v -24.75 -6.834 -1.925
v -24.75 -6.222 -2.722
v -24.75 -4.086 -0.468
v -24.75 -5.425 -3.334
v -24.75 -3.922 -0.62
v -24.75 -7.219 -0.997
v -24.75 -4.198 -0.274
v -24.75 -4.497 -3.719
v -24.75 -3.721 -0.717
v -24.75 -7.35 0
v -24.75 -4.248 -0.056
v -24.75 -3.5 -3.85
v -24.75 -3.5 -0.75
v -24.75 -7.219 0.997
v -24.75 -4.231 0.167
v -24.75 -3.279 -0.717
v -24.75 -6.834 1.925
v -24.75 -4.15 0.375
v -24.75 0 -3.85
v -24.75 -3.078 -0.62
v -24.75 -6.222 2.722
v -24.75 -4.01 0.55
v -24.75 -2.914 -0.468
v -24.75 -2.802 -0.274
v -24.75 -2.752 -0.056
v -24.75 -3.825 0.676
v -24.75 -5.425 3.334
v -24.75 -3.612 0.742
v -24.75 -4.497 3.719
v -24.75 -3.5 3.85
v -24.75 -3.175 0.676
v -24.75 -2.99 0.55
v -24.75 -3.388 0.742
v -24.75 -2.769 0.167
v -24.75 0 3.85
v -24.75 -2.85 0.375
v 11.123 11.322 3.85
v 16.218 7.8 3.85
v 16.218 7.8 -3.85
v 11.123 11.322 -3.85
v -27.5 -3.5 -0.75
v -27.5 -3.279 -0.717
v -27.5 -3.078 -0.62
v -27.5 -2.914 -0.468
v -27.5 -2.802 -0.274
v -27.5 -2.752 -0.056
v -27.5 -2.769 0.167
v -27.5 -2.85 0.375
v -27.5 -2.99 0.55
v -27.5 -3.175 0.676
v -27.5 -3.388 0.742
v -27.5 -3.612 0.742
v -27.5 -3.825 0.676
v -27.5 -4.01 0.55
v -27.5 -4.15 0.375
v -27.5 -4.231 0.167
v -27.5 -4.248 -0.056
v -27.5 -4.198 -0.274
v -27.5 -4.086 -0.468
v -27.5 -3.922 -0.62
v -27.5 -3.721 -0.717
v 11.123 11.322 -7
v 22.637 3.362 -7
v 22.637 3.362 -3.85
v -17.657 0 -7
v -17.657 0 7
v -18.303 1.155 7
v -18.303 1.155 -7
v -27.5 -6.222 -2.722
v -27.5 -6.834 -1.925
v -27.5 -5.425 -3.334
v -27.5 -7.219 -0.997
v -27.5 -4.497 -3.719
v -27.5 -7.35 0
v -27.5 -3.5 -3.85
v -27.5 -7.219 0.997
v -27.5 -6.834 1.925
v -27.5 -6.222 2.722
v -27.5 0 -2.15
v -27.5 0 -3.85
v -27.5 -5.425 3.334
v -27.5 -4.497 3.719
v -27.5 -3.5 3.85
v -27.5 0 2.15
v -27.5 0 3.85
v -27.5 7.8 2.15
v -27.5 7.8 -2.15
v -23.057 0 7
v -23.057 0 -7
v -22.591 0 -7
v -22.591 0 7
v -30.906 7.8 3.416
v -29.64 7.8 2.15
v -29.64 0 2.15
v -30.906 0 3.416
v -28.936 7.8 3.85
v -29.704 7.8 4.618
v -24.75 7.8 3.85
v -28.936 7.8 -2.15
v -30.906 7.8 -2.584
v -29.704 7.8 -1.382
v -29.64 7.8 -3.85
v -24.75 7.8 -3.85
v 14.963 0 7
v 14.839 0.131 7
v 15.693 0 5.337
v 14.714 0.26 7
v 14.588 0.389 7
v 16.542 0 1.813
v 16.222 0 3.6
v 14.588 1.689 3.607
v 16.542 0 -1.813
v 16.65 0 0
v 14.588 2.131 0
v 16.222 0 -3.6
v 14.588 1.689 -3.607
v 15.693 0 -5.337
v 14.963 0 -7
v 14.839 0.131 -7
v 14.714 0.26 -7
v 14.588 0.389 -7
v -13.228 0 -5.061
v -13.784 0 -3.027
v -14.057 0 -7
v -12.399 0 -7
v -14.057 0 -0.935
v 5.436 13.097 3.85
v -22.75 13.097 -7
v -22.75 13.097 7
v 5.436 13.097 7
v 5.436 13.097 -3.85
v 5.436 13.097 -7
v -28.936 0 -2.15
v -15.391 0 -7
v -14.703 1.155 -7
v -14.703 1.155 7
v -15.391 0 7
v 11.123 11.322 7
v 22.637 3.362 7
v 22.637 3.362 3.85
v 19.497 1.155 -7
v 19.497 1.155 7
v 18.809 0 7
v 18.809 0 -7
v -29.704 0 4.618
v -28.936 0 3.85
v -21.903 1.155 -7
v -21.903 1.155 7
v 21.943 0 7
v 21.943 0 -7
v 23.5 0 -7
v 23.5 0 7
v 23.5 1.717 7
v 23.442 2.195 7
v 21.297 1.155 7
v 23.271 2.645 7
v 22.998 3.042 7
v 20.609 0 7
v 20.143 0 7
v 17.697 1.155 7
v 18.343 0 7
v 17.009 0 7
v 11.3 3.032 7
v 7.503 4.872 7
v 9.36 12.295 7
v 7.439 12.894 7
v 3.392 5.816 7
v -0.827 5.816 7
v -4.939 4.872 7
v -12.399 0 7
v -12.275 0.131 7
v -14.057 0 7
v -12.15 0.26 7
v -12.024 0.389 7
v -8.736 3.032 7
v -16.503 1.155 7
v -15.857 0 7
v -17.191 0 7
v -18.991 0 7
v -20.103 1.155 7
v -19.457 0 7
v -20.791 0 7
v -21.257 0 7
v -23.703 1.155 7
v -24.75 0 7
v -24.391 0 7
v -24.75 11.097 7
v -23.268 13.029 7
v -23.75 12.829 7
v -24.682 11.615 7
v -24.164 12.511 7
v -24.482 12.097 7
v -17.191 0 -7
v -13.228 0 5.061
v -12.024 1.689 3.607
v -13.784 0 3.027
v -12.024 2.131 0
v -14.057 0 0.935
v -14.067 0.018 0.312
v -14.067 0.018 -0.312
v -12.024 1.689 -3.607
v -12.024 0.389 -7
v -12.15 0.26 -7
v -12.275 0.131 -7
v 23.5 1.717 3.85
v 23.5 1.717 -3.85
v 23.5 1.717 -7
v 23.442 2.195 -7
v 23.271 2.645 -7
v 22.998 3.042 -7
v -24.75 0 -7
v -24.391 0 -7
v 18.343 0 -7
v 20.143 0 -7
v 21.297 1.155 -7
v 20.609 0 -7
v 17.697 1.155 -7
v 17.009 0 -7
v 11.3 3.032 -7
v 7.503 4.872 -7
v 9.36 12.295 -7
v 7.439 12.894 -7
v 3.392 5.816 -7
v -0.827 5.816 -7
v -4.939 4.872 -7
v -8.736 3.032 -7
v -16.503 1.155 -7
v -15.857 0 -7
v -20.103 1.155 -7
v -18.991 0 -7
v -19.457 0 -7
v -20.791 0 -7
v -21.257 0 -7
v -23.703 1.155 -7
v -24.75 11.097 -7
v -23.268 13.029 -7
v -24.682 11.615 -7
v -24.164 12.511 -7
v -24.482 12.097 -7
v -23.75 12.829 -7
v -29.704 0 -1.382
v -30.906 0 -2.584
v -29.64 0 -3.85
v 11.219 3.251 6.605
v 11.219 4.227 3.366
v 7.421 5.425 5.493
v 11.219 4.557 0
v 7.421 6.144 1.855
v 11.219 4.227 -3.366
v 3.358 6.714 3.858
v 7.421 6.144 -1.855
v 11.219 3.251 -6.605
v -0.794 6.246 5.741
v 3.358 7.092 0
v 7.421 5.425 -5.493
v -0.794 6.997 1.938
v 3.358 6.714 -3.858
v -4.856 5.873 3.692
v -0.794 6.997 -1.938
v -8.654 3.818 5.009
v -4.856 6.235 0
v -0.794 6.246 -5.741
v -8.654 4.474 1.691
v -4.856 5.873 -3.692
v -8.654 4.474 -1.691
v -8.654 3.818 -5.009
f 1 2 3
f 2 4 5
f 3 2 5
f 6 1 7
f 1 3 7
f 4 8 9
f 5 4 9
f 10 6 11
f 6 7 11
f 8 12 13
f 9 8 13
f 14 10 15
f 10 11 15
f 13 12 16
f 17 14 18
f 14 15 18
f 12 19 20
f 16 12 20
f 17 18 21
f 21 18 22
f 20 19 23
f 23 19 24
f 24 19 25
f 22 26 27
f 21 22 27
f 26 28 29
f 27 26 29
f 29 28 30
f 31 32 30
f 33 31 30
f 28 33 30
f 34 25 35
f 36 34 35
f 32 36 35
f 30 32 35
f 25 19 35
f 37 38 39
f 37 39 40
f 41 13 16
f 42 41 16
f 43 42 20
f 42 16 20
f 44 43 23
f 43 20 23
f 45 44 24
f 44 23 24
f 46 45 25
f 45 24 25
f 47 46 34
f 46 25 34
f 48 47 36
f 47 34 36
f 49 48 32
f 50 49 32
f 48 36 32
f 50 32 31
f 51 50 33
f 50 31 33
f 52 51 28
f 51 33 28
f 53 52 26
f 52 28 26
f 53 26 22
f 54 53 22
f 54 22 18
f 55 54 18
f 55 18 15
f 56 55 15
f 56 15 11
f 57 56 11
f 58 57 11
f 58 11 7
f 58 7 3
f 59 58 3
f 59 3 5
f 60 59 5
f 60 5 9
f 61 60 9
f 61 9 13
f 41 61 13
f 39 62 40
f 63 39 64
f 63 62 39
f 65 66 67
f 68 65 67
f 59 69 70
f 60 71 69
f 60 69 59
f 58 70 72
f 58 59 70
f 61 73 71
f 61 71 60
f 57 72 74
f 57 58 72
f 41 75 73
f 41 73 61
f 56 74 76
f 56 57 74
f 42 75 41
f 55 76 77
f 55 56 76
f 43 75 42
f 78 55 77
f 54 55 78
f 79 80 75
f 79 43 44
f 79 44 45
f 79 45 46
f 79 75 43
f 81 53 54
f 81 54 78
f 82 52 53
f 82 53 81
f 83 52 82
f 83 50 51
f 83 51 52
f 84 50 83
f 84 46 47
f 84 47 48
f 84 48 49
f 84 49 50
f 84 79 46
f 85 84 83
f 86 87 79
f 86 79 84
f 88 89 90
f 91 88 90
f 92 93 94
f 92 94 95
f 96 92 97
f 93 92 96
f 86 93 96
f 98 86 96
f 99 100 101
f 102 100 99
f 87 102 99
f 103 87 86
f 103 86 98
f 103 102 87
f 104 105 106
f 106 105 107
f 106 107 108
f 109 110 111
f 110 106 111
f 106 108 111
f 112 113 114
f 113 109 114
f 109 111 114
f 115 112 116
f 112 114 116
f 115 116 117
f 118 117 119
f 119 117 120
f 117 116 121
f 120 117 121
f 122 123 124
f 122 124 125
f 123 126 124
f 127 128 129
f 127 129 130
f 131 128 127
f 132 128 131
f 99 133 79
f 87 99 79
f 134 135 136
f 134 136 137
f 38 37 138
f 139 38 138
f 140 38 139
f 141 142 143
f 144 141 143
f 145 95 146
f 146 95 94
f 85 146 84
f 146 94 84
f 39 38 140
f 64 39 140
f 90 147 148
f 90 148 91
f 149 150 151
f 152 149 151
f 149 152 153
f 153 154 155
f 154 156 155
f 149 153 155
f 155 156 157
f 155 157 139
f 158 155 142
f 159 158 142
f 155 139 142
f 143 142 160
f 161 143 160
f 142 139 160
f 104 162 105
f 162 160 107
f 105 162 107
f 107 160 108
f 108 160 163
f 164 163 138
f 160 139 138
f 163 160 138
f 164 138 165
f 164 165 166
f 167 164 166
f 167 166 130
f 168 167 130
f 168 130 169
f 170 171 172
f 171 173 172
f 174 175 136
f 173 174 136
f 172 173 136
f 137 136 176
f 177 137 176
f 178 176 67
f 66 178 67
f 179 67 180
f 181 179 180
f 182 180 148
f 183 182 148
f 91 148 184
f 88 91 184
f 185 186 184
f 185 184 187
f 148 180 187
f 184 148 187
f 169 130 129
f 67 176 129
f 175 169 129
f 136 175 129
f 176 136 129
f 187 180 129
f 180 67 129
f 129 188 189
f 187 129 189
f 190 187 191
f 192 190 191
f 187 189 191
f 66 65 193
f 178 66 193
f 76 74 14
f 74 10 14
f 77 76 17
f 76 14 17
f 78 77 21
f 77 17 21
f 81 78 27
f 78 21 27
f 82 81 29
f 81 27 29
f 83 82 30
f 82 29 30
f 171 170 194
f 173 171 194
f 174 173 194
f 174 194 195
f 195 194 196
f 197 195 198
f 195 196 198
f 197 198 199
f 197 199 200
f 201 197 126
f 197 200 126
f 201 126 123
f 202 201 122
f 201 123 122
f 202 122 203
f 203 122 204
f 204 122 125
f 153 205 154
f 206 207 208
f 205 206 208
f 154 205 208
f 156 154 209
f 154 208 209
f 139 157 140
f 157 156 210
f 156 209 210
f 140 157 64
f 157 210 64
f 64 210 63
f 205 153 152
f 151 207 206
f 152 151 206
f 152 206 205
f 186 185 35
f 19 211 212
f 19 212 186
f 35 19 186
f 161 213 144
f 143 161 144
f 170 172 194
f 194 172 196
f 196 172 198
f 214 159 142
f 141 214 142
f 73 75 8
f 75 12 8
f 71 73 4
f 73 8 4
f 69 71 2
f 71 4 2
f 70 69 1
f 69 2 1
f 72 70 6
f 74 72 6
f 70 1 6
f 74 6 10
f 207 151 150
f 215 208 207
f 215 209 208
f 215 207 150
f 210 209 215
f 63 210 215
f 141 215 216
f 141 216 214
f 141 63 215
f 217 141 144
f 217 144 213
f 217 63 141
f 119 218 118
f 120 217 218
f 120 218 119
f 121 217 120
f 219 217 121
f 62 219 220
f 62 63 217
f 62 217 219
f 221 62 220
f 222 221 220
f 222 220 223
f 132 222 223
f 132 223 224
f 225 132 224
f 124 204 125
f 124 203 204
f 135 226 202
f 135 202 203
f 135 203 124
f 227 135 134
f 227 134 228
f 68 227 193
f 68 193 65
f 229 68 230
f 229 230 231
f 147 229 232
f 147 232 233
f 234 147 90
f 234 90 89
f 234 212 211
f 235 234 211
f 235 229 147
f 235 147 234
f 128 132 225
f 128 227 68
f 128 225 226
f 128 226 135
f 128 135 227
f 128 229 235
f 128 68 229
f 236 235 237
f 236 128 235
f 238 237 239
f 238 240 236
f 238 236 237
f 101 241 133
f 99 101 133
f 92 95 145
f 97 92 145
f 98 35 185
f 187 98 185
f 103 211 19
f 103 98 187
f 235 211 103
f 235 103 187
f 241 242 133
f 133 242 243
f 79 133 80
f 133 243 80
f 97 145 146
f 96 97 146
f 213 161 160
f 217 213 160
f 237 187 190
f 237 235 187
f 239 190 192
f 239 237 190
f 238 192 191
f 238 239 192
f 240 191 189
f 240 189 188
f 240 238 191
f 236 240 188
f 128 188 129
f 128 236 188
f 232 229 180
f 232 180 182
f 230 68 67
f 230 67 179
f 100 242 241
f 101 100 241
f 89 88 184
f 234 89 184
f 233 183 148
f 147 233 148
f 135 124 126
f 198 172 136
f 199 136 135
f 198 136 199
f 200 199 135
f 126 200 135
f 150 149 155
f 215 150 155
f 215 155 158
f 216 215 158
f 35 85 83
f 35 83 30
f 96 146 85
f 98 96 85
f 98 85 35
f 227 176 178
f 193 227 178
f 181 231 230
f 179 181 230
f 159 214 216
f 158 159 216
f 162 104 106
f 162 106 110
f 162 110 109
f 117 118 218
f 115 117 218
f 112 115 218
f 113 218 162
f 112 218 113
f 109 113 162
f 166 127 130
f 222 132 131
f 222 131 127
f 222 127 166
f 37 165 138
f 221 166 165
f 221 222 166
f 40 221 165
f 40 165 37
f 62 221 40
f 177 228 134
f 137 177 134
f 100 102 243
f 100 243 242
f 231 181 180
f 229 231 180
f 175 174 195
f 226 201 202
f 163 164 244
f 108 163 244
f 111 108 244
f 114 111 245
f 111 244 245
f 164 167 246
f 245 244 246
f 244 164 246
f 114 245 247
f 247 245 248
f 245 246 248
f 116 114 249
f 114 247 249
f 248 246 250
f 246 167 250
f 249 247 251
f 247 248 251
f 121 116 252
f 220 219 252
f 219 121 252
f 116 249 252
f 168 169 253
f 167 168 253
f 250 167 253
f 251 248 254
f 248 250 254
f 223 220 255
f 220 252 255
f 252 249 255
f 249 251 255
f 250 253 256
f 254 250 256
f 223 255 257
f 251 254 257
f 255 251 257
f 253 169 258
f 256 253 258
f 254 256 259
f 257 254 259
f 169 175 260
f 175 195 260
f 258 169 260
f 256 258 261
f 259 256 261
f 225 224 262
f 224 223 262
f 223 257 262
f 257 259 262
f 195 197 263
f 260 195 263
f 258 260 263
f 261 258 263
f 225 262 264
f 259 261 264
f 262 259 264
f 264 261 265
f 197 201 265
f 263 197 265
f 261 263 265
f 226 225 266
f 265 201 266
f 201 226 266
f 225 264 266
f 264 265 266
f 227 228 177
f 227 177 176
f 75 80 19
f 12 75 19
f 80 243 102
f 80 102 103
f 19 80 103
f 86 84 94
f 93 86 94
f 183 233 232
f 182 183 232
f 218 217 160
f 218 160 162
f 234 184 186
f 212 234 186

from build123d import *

# Parameters (mm, degrees)
EXTRUDE_1_DEPTH              = 10
CUT_EXTRUDE_1_DEPTH          = 34.383433003
FILLET_1_SIZE                = 4
FILLET_1_SIZE_2              = 6
CUT_EXTRUDE_2_DEPTH          = 34.383433056
CUT_EXTRUDE_2_DEPTH_BACK     = 34.383433056
SKETCH_3_W                   = 58.405721138
SKETCH_3_H                   = 2.2
SKETCH_4_W                   = 2.75
SKETCH_4_H                   = 7.7
EXTRUDE_2_DEPTH              = 7.35
SKETCH_5_R                   = 0.75
CUT_EXTRUDE_3_DEPTH          = 54.030431013
FILLET_2_R                   = 3.85
CORTAR_EXTRUIR1_DEPTH        = 33.791669707
SALIENTE_EXTRUIR1_DEPTH      = 7.7
CROQUIS2_R                   = 20
CORTAR_EXTRUIR3_DEPTH        = 35.438086687
SALIENTE_EXTRUIR4_DEPTH      = 7
SALIENTE_EXTRUIR4_DEPTH_BACK = 7
CORTAR_EXTRUIR4_DEPTH        = 37.368830262
REDONDEO3_R                  = 2
REDONDEO4_R                  = 10


# Some blends are built 0.0001 mm under size
with BuildPart() as part:
    # 草图1 → 凸台-拉伸1 (new body)
    with BuildSketch(Plane(origin=(0, 0, 0), x_dir=(1, 0, 0), z_dir=(0, 1, 0))):
        Polygon((27.5, 3.85), (-27.5, 3.85), (-29.64, 3.85), (-30.905721138, 2.584278862), (-29.70363961, 1.382197334), (-28.935836944, 2.15), (-27.5, 2.15), (-27.5, -2.15), (-29.64, -2.15), (-30.905721138, -3.415721138), (-29.70363961, -4.617802666), (-28.935836944, -3.85), (-27.5, -3.85), (27.5, -3.85), align=None)
    extrude(amount=EXTRUDE_1_DEPTH)

    # 草图2 → 切除-拉伸1 (cut, through all)
    with BuildSketch(Plane.XY.offset(3.85)):
        with BuildLine():
            Line((-18.935836944, 0), (21.5, 0))
            ThreePointArc((21.5, 0), (1.282081528, 3.70613757), (-18.935836944, 0))
        make_face()
    extrude(amount=-CUT_EXTRUDE_1_DEPTH, mode=Mode.SUBTRACT)

    # 圆角1
    # an asymmetric fillet: 6, 4 mm, written as the material it takes off along each edge
    with BuildSketch(Plane(origin=(27.5, 0, 18.85), x_dir=(-1, 0, 0), z_dir=(0, 0, -1))) as fillet_1_piece_1:
        with BuildLine():
            Bezier((FILLET_1_SIZE, 0), (0, 0), (0, FILLET_1_SIZE_2), weights=[1, 0.707106781, 1])
            Line((0, FILLET_1_SIZE_2), (0, 0))
            Line((0, 0), (FILLET_1_SIZE, 0))
        make_face()
    extrude(amount=37.7, mode=Mode.SUBTRACT)

    # 草图3 → 切除-拉伸2 (cut, two sides: drawn at the far end of the back side and taken through both)
    with BuildSketch(Plane.XY.offset(3.85).offset(-CUT_EXTRUDE_2_DEPTH_BACK)):
        with Locations((-1.702860569, 8.9)):
            Rectangle(SKETCH_3_W, SKETCH_3_H)
    extrude(amount=CUT_EXTRUDE_2_DEPTH + CUT_EXTRUDE_2_DEPTH_BACK, mode=Mode.SUBTRACT)

    # 草图4 → 凸台-拉伸2 (add)
    with BuildSketch(Plane.XZ):
        with Locations((-26.125, 0)):
            Rectangle(SKETCH_4_W, SKETCH_4_H)
    extrude(amount=EXTRUDE_2_DEPTH)

    # 草图5 → 切除-拉伸3 (cut, through all)
    with BuildSketch(Plane(origin=(-24.75, 0, 0), x_dir=(0, 0, -1), z_dir=(1, 0, 0))):
        with Locations((0, -3.5)):
            Circle(SKETCH_5_R)
    extrude(amount=-CUT_EXTRUDE_3_DEPTH, mode=Mode.SUBTRACT)

    # 圆角2
    fillet_2_edges = [part.edges().sort_by_distance(p)[0] for p in [
        (-26.125, -7.35, -3.85),
        (-26.125, -7.35, 3.85),
    ]]
    fillet(fillet_2_edges, radius=FILLET_2_R - 0.0001)  # a hair under: the kernel refuses the full size

    # Croquis1 → Cortar-Extruir1 (cut, through all)
    with BuildSketch(Plane.XY.offset(3.85)):
        with BuildLine():
            Line((27.5, 7.8), (16.217886534, 7.8))
            Line((16.217886534, 7.8), (23.5, 2.765439303))
            Line((23.5, 2.765439303), (23.5, 0))
            add(Edge.make_bspline(
                [(27.5, 6), (27.5, 5.69042848), (27.487576866, 5.380787378), (27.462721246, 5.071641684), (27.425314756, 4.763619555), (27.375158046, 4.457411018), (27.311958659, 4.153772273), (27.15893131, 3.554601129), (27.069254161, 3.259173226), (26.965810638, 2.96797603), (26.848060748, 2.682057947), (26.71538748, 2.402788295), (26.567124674, 2.131846167), (26.305522028, 1.71806679), (26.202980384, 1.568477856), (26.094611251, 1.422961788), (25.980267973, 1.282053299), (25.859832084, 1.146386576), (25.733223411, 1.016687557), (25.50418613, 0.80470891), (25.40471615, 0.719219867), (25.301997411, 0.637611459), (25.196057574, 0.56023543), (25.086963249, 0.487470604), (24.97482846, 0.419710585), (24.681074838, 0.260429148), (24.49523869, 0.176468902), (24.303178892, 0.107130148), (24.106026723, 0.053886894), (23.905206432, 0.017937167), (23.702478464, 0), (23.5, 0)],
                knots=[0, 0, 0, 0, 0, 0, 0, 0, 0.272858712, 0.272858712, 0.272858712, 0.272858712, 0.272858712, 0.272858712, 0.544533939, 0.544533939, 0.544533939, 0.544533939, 0.544533939, 0.544533939, 0.704314184, 0.704314184, 0.704314184, 0.704314184, 0.704314184, 0.704314184, 0.820075996, 0.820075996, 0.820075996, 0.820075996, 0.820075996, 0.820075996, 1, 1, 1, 1, 1, 1, 1, 1], degree=7))
            Line((27.5, 6), (27.5, 7.8))
        make_face()
    extrude(amount=-CORTAR_EXTRUIR1_DEPTH, mode=Mode.SUBTRACT)

    # Croquis1<3> → Saliente-Extruir1 (add)
    with BuildSketch(Plane.XY.offset(3.85)):
        Polygon((-24.75, 13.096878085), (-24.75, 7.8), (16.217886534, 7.8), (8.556350692, 13.096878085), align=None)
        with BuildLine():
            ThreePointArc((21.5, 0), (1.282081528, 3.70613757), (-18.935836944, 0))
            Line((-18.935836944, 0), (21.5, 0))
        make_face()
        with BuildLine():
            Line((-24.75, 7.8), (-24.75, 0))
            Line((-24.75, 0), (-18.935836944, 0))
            ThreePointArc((-18.935836944, 0), (1.282081528, 3.70613757), (21.5, 0))
            Line((21.5, 0), (23.5, 0))
            Line((23.5, 0), (23.5, 2.765439303))
            Line((23.5, 2.765439303), (16.217886534, 7.8))
            Line((16.217886534, 7.8), (-24.75, 7.8))
        make_face()
    extrude(amount=-SALIENTE_EXTRUIR1_DEPTH)

    # Croquis2 → Cortar-Extruir3 (cut, through all)
    with BuildSketch(Plane.XY.offset(3.85)):
        with Locations((1.282081528, -12.8)):
            Circle(CROQUIS2_R)
    extrude(amount=-CORTAR_EXTRUIR3_DEPTH, mode=Mode.SUBTRACT)

    # Croquis3 → Saliente-Extruir4 (add, two sides: drawn at the far end of the back side and taken through both)
    with BuildSketch(Plane.XY.offset(-SALIENTE_EXTRUIR4_DEPTH_BACK)):
        with BuildLine():
            ThreePointArc((16.649579698, 0), (1.282081528, 7.2), (-14.085416642, 0))
            Line((-14.085416642, 0), (-24.75, 0))
            Line((-24.75, 0), (-24.75, 7.8))
            Line((-24.75, 7.8), (-24.75, 13.096878085))
            Line((-24.75, 13.096878085), (8.556350692, 13.096878085))
            Line((8.556350692, 13.096878085), (23.5, 2.765439303))
            Line((23.5, 2.765439303), (23.5, 0))
            Line((23.5, 0), (16.649579698, 0))
        make_face()
        with BuildLine():
            Line((16.649579698, 0), (-14.085416642, 0))
            ThreePointArc((-14.085416642, 0), (1.282081528, 7.2), (16.649579698, 0))
        make_face()
    extrude(amount=SALIENTE_EXTRUIR4_DEPTH + SALIENTE_EXTRUIR4_DEPTH_BACK)

    # Croquis4 → Cortar-Revolución2 (revolve, cut)
    with BuildSketch(Plane.XY):
        with BuildLine():
            ThreePointArc((14.588399238, 2.131239365), (1.282081528, 7.2), (-12.024236182, 2.131239365))
            ThreePointArc((-12.024236182, 2.131239365), (1.282081528, 3.70613757), (14.588399238, 2.131239365))
        make_face()
        with BuildLine():
            ThreePointArc((-12.024236182, 2.131239365), (-13.094374036, 1.103867282), (-14.085416642, 0))
            Line((-14.085416642, 0), (16.649579698, 0))
            ThreePointArc((16.649579698, 0), (15.658537092, 1.103867282), (14.588399238, 2.131239365))
            ThreePointArc((14.588399238, 2.131239365), (1.282081528, 3.70613757), (-12.024236182, 2.131239365))
        make_face()
    revolve(axis=Axis((1.282081528, -12.8, 0), (-1, 0, 0)), mode=Mode.SUBTRACT)

    # Croquis5 → Cortar-Extruir4 (cut, through all)
    with BuildSketch(Plane.XY.offset(7)):
        Polygon((-22.59131667, 0), (-21.246710257, -0.018288841), (-21.903174863, 1.155318891), align=None)
        Polygon((-24.39131667, 0), (-23.046710257, -0.018288841), (-23.703174863, 1.155318891), align=None)
        Polygon((-20.79131667, 0), (-19.446710257, -0.018288841), (-20.103174863, 1.155318891), align=None)
        Polygon((-18.99131667, 0), (-17.646710257, -0.018288841), (-18.303174863, 1.155318891), align=None)
        Polygon((-17.19131667, 0), (-15.846710257, -0.018288841), (-16.503174863, 1.155318891), align=None)
        Polygon((-15.39131667, 0), (-14.046710257, -0.018288841), (-14.703174863, 1.155318891), align=None)
        Polygon((17.00868333, 0), (18.353289743, -0.018288841), (17.696825137, 1.155318891), align=None)
        Polygon((18.80868333, 0), (20.153289743, -0.018288841), (19.496825137, 1.155318891), align=None)
        Polygon((20.60868333, 0), (21.953289743, -0.018288841), (21.296825137, 1.155318891), align=None)
    extrude(amount=-CORTAR_EXTRUIR4_DEPTH, mode=Mode.SUBTRACT)

    # Redondeo3
    redondeo3_edges = [part.edges().sort_by_distance(p)[0] for p in [
        (23.5, 2.765439303, 0),
        (-24.75, 13.096878085, 0),
    ]]
    fillet(redondeo3_edges, radius=REDONDEO3_R)

    # Redondeo4
    redondeo4_edges = [part.edges().sort_by_distance(p)[0] for p in [
        (8.556350692, 13.096878085, 0),
    ]]
    fillet(redondeo4_edges, radius=REDONDEO4_R)


solid = part.part
